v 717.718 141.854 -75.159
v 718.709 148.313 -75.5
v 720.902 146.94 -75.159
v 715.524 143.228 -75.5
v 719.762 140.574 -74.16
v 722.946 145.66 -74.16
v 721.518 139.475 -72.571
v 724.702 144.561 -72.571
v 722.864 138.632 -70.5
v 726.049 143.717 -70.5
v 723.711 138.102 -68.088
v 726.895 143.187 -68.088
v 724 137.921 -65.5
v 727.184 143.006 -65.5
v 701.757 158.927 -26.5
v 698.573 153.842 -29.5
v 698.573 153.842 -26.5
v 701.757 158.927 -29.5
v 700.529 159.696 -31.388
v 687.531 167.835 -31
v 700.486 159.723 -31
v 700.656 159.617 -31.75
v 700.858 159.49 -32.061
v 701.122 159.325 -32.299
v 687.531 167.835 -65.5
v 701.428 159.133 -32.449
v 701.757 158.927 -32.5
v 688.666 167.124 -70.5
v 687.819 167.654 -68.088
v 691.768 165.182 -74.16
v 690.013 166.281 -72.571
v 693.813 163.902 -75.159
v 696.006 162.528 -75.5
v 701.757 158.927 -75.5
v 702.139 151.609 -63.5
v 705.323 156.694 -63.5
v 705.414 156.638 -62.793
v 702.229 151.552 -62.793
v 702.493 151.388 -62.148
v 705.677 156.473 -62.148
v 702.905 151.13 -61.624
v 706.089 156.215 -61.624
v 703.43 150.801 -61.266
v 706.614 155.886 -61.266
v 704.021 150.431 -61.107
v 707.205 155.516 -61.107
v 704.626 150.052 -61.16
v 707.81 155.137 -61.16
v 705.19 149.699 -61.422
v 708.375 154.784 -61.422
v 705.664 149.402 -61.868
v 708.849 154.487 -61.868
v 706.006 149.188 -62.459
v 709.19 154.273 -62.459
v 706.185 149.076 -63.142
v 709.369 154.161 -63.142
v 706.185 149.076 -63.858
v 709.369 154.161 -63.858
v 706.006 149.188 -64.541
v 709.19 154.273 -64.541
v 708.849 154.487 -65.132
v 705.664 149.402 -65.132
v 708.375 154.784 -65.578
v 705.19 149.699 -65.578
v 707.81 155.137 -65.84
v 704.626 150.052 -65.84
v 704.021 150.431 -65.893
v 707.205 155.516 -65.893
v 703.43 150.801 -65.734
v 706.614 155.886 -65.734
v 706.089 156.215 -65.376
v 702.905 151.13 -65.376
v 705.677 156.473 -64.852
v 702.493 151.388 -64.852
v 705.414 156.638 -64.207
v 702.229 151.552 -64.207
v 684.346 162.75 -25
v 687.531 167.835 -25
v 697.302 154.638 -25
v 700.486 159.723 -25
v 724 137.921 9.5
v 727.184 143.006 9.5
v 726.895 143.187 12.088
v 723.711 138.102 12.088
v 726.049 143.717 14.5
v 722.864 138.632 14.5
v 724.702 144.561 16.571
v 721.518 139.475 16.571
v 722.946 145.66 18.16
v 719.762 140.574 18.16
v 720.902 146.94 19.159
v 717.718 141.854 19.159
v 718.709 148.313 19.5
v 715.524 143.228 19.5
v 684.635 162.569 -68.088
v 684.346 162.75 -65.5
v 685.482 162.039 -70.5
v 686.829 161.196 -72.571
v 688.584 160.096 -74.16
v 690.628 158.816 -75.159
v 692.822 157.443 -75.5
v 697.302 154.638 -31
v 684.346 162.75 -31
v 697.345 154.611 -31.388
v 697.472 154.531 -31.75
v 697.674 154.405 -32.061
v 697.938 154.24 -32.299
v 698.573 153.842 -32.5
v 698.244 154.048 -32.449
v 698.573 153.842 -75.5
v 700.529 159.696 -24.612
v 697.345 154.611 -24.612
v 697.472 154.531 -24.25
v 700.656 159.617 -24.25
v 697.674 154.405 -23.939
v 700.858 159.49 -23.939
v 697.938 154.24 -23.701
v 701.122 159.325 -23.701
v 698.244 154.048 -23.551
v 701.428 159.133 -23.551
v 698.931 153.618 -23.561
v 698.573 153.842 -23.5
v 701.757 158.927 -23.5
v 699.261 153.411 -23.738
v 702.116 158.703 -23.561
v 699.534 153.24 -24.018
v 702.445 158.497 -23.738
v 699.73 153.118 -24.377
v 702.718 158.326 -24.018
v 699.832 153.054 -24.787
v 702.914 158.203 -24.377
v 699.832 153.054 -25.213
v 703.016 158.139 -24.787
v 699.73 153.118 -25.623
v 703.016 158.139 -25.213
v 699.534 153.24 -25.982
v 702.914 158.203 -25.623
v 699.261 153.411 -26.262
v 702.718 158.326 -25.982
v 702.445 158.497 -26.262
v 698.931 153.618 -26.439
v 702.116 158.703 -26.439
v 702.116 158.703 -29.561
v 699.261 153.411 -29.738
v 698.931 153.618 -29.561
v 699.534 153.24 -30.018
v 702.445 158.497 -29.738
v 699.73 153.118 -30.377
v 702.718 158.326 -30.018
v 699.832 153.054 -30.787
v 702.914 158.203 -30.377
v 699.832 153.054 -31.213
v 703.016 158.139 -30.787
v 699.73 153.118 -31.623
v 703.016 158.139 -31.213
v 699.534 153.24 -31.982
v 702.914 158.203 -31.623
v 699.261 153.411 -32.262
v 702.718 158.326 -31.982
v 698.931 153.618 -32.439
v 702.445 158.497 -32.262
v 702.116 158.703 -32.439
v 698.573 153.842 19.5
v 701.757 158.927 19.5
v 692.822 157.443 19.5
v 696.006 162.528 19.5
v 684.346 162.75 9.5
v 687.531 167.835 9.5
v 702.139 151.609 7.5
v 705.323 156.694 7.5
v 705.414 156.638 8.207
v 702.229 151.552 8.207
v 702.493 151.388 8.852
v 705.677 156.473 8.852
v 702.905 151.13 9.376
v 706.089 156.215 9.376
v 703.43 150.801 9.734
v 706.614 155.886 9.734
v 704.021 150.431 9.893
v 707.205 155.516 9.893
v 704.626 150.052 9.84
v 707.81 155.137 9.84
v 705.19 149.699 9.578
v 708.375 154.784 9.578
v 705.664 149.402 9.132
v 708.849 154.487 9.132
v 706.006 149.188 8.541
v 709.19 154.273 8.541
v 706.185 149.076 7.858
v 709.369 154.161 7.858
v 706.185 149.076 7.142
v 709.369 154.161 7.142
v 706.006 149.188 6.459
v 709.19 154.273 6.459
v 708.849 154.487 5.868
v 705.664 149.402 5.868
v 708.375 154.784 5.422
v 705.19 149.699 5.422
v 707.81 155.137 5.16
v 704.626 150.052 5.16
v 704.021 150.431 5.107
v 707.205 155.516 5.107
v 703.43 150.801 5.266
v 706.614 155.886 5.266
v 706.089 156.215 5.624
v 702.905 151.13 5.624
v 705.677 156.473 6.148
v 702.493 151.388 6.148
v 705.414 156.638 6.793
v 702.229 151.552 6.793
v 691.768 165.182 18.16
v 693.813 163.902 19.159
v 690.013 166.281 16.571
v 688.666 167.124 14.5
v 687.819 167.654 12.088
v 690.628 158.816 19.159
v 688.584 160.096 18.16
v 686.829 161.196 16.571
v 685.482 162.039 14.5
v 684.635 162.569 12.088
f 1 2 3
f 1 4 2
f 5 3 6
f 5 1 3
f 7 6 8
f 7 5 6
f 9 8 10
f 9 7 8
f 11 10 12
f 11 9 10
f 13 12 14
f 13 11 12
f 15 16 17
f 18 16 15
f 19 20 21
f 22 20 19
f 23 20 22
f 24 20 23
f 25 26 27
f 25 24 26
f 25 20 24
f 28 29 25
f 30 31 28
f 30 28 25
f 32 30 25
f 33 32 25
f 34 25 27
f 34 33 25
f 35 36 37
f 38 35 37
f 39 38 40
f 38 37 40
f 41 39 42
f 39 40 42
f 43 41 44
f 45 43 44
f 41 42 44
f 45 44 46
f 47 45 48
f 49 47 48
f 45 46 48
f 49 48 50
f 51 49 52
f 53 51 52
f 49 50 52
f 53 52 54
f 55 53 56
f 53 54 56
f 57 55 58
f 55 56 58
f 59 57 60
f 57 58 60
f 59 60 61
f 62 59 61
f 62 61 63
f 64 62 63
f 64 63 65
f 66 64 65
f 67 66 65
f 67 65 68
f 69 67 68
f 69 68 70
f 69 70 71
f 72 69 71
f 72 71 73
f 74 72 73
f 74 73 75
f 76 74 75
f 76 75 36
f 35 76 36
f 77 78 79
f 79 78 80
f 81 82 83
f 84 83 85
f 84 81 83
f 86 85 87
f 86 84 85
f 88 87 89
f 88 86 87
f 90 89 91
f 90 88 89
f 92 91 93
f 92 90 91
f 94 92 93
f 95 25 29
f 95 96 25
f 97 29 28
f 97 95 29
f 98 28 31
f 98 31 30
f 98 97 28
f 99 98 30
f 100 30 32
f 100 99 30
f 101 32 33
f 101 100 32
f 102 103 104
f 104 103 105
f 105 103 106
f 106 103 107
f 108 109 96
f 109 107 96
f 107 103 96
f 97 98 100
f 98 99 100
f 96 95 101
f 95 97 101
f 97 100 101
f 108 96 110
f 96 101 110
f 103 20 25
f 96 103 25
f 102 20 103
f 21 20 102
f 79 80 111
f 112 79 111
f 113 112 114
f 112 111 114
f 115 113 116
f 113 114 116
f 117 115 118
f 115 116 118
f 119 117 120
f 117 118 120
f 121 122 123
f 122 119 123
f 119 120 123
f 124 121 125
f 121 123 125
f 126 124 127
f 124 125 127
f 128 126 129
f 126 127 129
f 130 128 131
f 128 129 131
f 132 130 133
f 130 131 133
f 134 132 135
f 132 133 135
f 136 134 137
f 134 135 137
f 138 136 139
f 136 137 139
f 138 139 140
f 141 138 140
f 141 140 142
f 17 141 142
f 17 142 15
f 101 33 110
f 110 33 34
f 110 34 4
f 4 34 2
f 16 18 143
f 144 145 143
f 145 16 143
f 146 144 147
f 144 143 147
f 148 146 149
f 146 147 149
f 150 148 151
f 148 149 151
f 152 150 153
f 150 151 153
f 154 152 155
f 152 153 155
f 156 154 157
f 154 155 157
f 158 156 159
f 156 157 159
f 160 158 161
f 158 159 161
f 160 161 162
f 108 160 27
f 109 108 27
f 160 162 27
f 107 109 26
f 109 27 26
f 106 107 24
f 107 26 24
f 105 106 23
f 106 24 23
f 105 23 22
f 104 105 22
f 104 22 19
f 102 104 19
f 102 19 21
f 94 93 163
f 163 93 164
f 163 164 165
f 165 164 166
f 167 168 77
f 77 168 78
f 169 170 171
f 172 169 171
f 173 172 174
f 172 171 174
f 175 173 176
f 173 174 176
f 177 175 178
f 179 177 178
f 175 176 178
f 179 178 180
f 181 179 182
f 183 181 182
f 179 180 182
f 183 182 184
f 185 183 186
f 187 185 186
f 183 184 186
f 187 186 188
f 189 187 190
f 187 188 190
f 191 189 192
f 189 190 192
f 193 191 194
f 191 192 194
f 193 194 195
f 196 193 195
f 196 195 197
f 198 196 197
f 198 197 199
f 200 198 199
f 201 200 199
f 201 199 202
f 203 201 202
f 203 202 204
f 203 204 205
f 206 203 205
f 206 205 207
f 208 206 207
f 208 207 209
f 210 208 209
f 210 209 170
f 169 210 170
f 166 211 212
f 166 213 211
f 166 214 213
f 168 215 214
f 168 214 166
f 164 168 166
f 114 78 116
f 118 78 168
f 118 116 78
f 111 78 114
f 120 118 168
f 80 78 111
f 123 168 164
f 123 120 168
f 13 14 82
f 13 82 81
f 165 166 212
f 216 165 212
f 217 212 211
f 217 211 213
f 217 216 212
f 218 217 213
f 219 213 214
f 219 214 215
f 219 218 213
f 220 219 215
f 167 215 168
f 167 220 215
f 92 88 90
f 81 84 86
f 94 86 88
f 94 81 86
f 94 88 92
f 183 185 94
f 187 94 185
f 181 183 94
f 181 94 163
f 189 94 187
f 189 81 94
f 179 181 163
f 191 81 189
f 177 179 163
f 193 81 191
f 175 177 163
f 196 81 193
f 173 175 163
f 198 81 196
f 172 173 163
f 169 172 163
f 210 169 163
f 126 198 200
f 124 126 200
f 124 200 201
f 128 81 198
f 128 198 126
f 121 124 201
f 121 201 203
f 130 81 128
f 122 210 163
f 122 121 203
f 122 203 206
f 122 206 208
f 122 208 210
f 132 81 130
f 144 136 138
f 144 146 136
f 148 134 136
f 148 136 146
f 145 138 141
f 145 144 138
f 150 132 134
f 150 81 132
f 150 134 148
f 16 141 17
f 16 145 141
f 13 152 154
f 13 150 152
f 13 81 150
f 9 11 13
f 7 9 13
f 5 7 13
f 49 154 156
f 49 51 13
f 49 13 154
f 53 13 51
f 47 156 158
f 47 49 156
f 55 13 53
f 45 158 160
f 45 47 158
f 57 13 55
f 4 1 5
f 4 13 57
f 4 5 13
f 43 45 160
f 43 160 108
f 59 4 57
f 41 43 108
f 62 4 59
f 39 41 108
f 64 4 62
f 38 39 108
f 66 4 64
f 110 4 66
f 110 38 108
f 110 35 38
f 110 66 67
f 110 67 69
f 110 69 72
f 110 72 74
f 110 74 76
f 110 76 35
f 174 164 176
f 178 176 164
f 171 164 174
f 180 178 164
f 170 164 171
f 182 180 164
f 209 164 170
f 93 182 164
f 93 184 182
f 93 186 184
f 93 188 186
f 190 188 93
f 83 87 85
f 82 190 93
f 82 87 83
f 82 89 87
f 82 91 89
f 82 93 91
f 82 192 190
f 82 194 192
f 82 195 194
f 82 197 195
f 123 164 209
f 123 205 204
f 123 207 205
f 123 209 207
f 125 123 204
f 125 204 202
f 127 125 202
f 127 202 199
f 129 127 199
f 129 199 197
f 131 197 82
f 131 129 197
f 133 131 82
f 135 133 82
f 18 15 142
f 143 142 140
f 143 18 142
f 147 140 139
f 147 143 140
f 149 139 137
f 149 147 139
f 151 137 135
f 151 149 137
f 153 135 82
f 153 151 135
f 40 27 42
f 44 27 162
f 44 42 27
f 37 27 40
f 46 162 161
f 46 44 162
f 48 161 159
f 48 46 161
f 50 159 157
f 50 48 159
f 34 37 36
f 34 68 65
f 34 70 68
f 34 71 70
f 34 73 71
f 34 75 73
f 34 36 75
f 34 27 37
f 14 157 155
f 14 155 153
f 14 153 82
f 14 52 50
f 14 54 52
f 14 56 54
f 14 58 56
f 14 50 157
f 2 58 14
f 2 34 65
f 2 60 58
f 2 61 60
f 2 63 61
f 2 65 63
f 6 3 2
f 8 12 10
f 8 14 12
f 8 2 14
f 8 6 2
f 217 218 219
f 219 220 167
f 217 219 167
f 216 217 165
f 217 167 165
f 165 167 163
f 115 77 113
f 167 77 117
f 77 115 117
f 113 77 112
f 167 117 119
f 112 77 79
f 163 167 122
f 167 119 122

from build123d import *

# Parameters (mm, degrees)
BOSS_EXTRUDE1_DEPTH      = 44.5
BOSS_EXTRUDE1_DEPTH_BACK = 50.5
SKETCH2_W                = 16.785504055
SKETCH2_H                = 44.5
BOSS_EXTRUDE2_DEPTH      = 6
FILLET1_R                = 10
SKETCH3_R                = 1.5
SKETCH3_R_2              = 2.4
CUT_EXTRUDE1_DEPTH       = 549.376643642


with BuildPart() as part:
    # Sketch1 → Boss-Extrude1 (new, two sides: drawn at the far end of the back side and taken through both)
    with BuildSketch(Plane.XY.offset(-25).offset(-BOSS_EXTRUDE1_DEPTH_BACK)):
        Polygon((724, 137.920851515), (698.573213095, 153.84185989), (701.75741477, 158.927217271), (727.184201675, 143.006208896), align=None)
    extrude(amount=BOSS_EXTRUDE1_DEPTH + BOSS_EXTRUDE1_DEPTH_BACK)

    # Sketch2 → Boss-Extrude2 (add)
    with BuildSketch(Plane(origin=(269.130391352, 429.817066188, 0), x_dir=(0.8475595635030609, -0.5307002791731893, 0), z_dir=(0.5307002791731893, 0.8475595635030609, 0))):
        with Locations((502.045737546, 53.25)):
            Rectangle(SKETCH2_W, SKETCH2_H)
        with Locations((502.045737546, 2.75)):
            Rectangle(SKETCH2_W, SKETCH2_H)
    extrude(amount=-BOSS_EXTRUDE2_DEPTH)

    # Fillet1
    fillet1_edges = [part.edges().sort_by_distance(p)[0] for p in [
        (725.592100838, 140.463530205, -75.5),
        (725.592100838, 140.463530205, 19.5),
        (685.938599442, 165.292610269, -75.5),
        (685.938599442, 165.292610269, 19.5),
    ]]
    fillet(fillet1_edges, radius=FILLET1_R)

    # Sketch3 → Cut-Extrude1 (cut, through all)
    with BuildSketch(Plane(origin=(269.130391352, 429.817066188, 0), x_dir=(0.8475595635030609, -0.5307002791731893, 0), z_dir=(0.5307002791731893, 0.8475595635030609, 0))):
        with Locations((510.438489573, 25)):
            Circle(SKETCH3_R)
        with Locations((510.438489573, 31)):
            Circle(SKETCH3_R)
        with Locations(Location((517.045737546, -7.5, 0), (0, 0, 180))):
            Circle(SKETCH3_R_2)
        with Locations(Location((517.045737546, 63.5, 0), (0, 0, 180))):
            Circle(SKETCH3_R_2)
    extrude(amount=-CUT_EXTRUDE1_DEPTH, mode=Mode.SUBTRACT)


solid = part.part
